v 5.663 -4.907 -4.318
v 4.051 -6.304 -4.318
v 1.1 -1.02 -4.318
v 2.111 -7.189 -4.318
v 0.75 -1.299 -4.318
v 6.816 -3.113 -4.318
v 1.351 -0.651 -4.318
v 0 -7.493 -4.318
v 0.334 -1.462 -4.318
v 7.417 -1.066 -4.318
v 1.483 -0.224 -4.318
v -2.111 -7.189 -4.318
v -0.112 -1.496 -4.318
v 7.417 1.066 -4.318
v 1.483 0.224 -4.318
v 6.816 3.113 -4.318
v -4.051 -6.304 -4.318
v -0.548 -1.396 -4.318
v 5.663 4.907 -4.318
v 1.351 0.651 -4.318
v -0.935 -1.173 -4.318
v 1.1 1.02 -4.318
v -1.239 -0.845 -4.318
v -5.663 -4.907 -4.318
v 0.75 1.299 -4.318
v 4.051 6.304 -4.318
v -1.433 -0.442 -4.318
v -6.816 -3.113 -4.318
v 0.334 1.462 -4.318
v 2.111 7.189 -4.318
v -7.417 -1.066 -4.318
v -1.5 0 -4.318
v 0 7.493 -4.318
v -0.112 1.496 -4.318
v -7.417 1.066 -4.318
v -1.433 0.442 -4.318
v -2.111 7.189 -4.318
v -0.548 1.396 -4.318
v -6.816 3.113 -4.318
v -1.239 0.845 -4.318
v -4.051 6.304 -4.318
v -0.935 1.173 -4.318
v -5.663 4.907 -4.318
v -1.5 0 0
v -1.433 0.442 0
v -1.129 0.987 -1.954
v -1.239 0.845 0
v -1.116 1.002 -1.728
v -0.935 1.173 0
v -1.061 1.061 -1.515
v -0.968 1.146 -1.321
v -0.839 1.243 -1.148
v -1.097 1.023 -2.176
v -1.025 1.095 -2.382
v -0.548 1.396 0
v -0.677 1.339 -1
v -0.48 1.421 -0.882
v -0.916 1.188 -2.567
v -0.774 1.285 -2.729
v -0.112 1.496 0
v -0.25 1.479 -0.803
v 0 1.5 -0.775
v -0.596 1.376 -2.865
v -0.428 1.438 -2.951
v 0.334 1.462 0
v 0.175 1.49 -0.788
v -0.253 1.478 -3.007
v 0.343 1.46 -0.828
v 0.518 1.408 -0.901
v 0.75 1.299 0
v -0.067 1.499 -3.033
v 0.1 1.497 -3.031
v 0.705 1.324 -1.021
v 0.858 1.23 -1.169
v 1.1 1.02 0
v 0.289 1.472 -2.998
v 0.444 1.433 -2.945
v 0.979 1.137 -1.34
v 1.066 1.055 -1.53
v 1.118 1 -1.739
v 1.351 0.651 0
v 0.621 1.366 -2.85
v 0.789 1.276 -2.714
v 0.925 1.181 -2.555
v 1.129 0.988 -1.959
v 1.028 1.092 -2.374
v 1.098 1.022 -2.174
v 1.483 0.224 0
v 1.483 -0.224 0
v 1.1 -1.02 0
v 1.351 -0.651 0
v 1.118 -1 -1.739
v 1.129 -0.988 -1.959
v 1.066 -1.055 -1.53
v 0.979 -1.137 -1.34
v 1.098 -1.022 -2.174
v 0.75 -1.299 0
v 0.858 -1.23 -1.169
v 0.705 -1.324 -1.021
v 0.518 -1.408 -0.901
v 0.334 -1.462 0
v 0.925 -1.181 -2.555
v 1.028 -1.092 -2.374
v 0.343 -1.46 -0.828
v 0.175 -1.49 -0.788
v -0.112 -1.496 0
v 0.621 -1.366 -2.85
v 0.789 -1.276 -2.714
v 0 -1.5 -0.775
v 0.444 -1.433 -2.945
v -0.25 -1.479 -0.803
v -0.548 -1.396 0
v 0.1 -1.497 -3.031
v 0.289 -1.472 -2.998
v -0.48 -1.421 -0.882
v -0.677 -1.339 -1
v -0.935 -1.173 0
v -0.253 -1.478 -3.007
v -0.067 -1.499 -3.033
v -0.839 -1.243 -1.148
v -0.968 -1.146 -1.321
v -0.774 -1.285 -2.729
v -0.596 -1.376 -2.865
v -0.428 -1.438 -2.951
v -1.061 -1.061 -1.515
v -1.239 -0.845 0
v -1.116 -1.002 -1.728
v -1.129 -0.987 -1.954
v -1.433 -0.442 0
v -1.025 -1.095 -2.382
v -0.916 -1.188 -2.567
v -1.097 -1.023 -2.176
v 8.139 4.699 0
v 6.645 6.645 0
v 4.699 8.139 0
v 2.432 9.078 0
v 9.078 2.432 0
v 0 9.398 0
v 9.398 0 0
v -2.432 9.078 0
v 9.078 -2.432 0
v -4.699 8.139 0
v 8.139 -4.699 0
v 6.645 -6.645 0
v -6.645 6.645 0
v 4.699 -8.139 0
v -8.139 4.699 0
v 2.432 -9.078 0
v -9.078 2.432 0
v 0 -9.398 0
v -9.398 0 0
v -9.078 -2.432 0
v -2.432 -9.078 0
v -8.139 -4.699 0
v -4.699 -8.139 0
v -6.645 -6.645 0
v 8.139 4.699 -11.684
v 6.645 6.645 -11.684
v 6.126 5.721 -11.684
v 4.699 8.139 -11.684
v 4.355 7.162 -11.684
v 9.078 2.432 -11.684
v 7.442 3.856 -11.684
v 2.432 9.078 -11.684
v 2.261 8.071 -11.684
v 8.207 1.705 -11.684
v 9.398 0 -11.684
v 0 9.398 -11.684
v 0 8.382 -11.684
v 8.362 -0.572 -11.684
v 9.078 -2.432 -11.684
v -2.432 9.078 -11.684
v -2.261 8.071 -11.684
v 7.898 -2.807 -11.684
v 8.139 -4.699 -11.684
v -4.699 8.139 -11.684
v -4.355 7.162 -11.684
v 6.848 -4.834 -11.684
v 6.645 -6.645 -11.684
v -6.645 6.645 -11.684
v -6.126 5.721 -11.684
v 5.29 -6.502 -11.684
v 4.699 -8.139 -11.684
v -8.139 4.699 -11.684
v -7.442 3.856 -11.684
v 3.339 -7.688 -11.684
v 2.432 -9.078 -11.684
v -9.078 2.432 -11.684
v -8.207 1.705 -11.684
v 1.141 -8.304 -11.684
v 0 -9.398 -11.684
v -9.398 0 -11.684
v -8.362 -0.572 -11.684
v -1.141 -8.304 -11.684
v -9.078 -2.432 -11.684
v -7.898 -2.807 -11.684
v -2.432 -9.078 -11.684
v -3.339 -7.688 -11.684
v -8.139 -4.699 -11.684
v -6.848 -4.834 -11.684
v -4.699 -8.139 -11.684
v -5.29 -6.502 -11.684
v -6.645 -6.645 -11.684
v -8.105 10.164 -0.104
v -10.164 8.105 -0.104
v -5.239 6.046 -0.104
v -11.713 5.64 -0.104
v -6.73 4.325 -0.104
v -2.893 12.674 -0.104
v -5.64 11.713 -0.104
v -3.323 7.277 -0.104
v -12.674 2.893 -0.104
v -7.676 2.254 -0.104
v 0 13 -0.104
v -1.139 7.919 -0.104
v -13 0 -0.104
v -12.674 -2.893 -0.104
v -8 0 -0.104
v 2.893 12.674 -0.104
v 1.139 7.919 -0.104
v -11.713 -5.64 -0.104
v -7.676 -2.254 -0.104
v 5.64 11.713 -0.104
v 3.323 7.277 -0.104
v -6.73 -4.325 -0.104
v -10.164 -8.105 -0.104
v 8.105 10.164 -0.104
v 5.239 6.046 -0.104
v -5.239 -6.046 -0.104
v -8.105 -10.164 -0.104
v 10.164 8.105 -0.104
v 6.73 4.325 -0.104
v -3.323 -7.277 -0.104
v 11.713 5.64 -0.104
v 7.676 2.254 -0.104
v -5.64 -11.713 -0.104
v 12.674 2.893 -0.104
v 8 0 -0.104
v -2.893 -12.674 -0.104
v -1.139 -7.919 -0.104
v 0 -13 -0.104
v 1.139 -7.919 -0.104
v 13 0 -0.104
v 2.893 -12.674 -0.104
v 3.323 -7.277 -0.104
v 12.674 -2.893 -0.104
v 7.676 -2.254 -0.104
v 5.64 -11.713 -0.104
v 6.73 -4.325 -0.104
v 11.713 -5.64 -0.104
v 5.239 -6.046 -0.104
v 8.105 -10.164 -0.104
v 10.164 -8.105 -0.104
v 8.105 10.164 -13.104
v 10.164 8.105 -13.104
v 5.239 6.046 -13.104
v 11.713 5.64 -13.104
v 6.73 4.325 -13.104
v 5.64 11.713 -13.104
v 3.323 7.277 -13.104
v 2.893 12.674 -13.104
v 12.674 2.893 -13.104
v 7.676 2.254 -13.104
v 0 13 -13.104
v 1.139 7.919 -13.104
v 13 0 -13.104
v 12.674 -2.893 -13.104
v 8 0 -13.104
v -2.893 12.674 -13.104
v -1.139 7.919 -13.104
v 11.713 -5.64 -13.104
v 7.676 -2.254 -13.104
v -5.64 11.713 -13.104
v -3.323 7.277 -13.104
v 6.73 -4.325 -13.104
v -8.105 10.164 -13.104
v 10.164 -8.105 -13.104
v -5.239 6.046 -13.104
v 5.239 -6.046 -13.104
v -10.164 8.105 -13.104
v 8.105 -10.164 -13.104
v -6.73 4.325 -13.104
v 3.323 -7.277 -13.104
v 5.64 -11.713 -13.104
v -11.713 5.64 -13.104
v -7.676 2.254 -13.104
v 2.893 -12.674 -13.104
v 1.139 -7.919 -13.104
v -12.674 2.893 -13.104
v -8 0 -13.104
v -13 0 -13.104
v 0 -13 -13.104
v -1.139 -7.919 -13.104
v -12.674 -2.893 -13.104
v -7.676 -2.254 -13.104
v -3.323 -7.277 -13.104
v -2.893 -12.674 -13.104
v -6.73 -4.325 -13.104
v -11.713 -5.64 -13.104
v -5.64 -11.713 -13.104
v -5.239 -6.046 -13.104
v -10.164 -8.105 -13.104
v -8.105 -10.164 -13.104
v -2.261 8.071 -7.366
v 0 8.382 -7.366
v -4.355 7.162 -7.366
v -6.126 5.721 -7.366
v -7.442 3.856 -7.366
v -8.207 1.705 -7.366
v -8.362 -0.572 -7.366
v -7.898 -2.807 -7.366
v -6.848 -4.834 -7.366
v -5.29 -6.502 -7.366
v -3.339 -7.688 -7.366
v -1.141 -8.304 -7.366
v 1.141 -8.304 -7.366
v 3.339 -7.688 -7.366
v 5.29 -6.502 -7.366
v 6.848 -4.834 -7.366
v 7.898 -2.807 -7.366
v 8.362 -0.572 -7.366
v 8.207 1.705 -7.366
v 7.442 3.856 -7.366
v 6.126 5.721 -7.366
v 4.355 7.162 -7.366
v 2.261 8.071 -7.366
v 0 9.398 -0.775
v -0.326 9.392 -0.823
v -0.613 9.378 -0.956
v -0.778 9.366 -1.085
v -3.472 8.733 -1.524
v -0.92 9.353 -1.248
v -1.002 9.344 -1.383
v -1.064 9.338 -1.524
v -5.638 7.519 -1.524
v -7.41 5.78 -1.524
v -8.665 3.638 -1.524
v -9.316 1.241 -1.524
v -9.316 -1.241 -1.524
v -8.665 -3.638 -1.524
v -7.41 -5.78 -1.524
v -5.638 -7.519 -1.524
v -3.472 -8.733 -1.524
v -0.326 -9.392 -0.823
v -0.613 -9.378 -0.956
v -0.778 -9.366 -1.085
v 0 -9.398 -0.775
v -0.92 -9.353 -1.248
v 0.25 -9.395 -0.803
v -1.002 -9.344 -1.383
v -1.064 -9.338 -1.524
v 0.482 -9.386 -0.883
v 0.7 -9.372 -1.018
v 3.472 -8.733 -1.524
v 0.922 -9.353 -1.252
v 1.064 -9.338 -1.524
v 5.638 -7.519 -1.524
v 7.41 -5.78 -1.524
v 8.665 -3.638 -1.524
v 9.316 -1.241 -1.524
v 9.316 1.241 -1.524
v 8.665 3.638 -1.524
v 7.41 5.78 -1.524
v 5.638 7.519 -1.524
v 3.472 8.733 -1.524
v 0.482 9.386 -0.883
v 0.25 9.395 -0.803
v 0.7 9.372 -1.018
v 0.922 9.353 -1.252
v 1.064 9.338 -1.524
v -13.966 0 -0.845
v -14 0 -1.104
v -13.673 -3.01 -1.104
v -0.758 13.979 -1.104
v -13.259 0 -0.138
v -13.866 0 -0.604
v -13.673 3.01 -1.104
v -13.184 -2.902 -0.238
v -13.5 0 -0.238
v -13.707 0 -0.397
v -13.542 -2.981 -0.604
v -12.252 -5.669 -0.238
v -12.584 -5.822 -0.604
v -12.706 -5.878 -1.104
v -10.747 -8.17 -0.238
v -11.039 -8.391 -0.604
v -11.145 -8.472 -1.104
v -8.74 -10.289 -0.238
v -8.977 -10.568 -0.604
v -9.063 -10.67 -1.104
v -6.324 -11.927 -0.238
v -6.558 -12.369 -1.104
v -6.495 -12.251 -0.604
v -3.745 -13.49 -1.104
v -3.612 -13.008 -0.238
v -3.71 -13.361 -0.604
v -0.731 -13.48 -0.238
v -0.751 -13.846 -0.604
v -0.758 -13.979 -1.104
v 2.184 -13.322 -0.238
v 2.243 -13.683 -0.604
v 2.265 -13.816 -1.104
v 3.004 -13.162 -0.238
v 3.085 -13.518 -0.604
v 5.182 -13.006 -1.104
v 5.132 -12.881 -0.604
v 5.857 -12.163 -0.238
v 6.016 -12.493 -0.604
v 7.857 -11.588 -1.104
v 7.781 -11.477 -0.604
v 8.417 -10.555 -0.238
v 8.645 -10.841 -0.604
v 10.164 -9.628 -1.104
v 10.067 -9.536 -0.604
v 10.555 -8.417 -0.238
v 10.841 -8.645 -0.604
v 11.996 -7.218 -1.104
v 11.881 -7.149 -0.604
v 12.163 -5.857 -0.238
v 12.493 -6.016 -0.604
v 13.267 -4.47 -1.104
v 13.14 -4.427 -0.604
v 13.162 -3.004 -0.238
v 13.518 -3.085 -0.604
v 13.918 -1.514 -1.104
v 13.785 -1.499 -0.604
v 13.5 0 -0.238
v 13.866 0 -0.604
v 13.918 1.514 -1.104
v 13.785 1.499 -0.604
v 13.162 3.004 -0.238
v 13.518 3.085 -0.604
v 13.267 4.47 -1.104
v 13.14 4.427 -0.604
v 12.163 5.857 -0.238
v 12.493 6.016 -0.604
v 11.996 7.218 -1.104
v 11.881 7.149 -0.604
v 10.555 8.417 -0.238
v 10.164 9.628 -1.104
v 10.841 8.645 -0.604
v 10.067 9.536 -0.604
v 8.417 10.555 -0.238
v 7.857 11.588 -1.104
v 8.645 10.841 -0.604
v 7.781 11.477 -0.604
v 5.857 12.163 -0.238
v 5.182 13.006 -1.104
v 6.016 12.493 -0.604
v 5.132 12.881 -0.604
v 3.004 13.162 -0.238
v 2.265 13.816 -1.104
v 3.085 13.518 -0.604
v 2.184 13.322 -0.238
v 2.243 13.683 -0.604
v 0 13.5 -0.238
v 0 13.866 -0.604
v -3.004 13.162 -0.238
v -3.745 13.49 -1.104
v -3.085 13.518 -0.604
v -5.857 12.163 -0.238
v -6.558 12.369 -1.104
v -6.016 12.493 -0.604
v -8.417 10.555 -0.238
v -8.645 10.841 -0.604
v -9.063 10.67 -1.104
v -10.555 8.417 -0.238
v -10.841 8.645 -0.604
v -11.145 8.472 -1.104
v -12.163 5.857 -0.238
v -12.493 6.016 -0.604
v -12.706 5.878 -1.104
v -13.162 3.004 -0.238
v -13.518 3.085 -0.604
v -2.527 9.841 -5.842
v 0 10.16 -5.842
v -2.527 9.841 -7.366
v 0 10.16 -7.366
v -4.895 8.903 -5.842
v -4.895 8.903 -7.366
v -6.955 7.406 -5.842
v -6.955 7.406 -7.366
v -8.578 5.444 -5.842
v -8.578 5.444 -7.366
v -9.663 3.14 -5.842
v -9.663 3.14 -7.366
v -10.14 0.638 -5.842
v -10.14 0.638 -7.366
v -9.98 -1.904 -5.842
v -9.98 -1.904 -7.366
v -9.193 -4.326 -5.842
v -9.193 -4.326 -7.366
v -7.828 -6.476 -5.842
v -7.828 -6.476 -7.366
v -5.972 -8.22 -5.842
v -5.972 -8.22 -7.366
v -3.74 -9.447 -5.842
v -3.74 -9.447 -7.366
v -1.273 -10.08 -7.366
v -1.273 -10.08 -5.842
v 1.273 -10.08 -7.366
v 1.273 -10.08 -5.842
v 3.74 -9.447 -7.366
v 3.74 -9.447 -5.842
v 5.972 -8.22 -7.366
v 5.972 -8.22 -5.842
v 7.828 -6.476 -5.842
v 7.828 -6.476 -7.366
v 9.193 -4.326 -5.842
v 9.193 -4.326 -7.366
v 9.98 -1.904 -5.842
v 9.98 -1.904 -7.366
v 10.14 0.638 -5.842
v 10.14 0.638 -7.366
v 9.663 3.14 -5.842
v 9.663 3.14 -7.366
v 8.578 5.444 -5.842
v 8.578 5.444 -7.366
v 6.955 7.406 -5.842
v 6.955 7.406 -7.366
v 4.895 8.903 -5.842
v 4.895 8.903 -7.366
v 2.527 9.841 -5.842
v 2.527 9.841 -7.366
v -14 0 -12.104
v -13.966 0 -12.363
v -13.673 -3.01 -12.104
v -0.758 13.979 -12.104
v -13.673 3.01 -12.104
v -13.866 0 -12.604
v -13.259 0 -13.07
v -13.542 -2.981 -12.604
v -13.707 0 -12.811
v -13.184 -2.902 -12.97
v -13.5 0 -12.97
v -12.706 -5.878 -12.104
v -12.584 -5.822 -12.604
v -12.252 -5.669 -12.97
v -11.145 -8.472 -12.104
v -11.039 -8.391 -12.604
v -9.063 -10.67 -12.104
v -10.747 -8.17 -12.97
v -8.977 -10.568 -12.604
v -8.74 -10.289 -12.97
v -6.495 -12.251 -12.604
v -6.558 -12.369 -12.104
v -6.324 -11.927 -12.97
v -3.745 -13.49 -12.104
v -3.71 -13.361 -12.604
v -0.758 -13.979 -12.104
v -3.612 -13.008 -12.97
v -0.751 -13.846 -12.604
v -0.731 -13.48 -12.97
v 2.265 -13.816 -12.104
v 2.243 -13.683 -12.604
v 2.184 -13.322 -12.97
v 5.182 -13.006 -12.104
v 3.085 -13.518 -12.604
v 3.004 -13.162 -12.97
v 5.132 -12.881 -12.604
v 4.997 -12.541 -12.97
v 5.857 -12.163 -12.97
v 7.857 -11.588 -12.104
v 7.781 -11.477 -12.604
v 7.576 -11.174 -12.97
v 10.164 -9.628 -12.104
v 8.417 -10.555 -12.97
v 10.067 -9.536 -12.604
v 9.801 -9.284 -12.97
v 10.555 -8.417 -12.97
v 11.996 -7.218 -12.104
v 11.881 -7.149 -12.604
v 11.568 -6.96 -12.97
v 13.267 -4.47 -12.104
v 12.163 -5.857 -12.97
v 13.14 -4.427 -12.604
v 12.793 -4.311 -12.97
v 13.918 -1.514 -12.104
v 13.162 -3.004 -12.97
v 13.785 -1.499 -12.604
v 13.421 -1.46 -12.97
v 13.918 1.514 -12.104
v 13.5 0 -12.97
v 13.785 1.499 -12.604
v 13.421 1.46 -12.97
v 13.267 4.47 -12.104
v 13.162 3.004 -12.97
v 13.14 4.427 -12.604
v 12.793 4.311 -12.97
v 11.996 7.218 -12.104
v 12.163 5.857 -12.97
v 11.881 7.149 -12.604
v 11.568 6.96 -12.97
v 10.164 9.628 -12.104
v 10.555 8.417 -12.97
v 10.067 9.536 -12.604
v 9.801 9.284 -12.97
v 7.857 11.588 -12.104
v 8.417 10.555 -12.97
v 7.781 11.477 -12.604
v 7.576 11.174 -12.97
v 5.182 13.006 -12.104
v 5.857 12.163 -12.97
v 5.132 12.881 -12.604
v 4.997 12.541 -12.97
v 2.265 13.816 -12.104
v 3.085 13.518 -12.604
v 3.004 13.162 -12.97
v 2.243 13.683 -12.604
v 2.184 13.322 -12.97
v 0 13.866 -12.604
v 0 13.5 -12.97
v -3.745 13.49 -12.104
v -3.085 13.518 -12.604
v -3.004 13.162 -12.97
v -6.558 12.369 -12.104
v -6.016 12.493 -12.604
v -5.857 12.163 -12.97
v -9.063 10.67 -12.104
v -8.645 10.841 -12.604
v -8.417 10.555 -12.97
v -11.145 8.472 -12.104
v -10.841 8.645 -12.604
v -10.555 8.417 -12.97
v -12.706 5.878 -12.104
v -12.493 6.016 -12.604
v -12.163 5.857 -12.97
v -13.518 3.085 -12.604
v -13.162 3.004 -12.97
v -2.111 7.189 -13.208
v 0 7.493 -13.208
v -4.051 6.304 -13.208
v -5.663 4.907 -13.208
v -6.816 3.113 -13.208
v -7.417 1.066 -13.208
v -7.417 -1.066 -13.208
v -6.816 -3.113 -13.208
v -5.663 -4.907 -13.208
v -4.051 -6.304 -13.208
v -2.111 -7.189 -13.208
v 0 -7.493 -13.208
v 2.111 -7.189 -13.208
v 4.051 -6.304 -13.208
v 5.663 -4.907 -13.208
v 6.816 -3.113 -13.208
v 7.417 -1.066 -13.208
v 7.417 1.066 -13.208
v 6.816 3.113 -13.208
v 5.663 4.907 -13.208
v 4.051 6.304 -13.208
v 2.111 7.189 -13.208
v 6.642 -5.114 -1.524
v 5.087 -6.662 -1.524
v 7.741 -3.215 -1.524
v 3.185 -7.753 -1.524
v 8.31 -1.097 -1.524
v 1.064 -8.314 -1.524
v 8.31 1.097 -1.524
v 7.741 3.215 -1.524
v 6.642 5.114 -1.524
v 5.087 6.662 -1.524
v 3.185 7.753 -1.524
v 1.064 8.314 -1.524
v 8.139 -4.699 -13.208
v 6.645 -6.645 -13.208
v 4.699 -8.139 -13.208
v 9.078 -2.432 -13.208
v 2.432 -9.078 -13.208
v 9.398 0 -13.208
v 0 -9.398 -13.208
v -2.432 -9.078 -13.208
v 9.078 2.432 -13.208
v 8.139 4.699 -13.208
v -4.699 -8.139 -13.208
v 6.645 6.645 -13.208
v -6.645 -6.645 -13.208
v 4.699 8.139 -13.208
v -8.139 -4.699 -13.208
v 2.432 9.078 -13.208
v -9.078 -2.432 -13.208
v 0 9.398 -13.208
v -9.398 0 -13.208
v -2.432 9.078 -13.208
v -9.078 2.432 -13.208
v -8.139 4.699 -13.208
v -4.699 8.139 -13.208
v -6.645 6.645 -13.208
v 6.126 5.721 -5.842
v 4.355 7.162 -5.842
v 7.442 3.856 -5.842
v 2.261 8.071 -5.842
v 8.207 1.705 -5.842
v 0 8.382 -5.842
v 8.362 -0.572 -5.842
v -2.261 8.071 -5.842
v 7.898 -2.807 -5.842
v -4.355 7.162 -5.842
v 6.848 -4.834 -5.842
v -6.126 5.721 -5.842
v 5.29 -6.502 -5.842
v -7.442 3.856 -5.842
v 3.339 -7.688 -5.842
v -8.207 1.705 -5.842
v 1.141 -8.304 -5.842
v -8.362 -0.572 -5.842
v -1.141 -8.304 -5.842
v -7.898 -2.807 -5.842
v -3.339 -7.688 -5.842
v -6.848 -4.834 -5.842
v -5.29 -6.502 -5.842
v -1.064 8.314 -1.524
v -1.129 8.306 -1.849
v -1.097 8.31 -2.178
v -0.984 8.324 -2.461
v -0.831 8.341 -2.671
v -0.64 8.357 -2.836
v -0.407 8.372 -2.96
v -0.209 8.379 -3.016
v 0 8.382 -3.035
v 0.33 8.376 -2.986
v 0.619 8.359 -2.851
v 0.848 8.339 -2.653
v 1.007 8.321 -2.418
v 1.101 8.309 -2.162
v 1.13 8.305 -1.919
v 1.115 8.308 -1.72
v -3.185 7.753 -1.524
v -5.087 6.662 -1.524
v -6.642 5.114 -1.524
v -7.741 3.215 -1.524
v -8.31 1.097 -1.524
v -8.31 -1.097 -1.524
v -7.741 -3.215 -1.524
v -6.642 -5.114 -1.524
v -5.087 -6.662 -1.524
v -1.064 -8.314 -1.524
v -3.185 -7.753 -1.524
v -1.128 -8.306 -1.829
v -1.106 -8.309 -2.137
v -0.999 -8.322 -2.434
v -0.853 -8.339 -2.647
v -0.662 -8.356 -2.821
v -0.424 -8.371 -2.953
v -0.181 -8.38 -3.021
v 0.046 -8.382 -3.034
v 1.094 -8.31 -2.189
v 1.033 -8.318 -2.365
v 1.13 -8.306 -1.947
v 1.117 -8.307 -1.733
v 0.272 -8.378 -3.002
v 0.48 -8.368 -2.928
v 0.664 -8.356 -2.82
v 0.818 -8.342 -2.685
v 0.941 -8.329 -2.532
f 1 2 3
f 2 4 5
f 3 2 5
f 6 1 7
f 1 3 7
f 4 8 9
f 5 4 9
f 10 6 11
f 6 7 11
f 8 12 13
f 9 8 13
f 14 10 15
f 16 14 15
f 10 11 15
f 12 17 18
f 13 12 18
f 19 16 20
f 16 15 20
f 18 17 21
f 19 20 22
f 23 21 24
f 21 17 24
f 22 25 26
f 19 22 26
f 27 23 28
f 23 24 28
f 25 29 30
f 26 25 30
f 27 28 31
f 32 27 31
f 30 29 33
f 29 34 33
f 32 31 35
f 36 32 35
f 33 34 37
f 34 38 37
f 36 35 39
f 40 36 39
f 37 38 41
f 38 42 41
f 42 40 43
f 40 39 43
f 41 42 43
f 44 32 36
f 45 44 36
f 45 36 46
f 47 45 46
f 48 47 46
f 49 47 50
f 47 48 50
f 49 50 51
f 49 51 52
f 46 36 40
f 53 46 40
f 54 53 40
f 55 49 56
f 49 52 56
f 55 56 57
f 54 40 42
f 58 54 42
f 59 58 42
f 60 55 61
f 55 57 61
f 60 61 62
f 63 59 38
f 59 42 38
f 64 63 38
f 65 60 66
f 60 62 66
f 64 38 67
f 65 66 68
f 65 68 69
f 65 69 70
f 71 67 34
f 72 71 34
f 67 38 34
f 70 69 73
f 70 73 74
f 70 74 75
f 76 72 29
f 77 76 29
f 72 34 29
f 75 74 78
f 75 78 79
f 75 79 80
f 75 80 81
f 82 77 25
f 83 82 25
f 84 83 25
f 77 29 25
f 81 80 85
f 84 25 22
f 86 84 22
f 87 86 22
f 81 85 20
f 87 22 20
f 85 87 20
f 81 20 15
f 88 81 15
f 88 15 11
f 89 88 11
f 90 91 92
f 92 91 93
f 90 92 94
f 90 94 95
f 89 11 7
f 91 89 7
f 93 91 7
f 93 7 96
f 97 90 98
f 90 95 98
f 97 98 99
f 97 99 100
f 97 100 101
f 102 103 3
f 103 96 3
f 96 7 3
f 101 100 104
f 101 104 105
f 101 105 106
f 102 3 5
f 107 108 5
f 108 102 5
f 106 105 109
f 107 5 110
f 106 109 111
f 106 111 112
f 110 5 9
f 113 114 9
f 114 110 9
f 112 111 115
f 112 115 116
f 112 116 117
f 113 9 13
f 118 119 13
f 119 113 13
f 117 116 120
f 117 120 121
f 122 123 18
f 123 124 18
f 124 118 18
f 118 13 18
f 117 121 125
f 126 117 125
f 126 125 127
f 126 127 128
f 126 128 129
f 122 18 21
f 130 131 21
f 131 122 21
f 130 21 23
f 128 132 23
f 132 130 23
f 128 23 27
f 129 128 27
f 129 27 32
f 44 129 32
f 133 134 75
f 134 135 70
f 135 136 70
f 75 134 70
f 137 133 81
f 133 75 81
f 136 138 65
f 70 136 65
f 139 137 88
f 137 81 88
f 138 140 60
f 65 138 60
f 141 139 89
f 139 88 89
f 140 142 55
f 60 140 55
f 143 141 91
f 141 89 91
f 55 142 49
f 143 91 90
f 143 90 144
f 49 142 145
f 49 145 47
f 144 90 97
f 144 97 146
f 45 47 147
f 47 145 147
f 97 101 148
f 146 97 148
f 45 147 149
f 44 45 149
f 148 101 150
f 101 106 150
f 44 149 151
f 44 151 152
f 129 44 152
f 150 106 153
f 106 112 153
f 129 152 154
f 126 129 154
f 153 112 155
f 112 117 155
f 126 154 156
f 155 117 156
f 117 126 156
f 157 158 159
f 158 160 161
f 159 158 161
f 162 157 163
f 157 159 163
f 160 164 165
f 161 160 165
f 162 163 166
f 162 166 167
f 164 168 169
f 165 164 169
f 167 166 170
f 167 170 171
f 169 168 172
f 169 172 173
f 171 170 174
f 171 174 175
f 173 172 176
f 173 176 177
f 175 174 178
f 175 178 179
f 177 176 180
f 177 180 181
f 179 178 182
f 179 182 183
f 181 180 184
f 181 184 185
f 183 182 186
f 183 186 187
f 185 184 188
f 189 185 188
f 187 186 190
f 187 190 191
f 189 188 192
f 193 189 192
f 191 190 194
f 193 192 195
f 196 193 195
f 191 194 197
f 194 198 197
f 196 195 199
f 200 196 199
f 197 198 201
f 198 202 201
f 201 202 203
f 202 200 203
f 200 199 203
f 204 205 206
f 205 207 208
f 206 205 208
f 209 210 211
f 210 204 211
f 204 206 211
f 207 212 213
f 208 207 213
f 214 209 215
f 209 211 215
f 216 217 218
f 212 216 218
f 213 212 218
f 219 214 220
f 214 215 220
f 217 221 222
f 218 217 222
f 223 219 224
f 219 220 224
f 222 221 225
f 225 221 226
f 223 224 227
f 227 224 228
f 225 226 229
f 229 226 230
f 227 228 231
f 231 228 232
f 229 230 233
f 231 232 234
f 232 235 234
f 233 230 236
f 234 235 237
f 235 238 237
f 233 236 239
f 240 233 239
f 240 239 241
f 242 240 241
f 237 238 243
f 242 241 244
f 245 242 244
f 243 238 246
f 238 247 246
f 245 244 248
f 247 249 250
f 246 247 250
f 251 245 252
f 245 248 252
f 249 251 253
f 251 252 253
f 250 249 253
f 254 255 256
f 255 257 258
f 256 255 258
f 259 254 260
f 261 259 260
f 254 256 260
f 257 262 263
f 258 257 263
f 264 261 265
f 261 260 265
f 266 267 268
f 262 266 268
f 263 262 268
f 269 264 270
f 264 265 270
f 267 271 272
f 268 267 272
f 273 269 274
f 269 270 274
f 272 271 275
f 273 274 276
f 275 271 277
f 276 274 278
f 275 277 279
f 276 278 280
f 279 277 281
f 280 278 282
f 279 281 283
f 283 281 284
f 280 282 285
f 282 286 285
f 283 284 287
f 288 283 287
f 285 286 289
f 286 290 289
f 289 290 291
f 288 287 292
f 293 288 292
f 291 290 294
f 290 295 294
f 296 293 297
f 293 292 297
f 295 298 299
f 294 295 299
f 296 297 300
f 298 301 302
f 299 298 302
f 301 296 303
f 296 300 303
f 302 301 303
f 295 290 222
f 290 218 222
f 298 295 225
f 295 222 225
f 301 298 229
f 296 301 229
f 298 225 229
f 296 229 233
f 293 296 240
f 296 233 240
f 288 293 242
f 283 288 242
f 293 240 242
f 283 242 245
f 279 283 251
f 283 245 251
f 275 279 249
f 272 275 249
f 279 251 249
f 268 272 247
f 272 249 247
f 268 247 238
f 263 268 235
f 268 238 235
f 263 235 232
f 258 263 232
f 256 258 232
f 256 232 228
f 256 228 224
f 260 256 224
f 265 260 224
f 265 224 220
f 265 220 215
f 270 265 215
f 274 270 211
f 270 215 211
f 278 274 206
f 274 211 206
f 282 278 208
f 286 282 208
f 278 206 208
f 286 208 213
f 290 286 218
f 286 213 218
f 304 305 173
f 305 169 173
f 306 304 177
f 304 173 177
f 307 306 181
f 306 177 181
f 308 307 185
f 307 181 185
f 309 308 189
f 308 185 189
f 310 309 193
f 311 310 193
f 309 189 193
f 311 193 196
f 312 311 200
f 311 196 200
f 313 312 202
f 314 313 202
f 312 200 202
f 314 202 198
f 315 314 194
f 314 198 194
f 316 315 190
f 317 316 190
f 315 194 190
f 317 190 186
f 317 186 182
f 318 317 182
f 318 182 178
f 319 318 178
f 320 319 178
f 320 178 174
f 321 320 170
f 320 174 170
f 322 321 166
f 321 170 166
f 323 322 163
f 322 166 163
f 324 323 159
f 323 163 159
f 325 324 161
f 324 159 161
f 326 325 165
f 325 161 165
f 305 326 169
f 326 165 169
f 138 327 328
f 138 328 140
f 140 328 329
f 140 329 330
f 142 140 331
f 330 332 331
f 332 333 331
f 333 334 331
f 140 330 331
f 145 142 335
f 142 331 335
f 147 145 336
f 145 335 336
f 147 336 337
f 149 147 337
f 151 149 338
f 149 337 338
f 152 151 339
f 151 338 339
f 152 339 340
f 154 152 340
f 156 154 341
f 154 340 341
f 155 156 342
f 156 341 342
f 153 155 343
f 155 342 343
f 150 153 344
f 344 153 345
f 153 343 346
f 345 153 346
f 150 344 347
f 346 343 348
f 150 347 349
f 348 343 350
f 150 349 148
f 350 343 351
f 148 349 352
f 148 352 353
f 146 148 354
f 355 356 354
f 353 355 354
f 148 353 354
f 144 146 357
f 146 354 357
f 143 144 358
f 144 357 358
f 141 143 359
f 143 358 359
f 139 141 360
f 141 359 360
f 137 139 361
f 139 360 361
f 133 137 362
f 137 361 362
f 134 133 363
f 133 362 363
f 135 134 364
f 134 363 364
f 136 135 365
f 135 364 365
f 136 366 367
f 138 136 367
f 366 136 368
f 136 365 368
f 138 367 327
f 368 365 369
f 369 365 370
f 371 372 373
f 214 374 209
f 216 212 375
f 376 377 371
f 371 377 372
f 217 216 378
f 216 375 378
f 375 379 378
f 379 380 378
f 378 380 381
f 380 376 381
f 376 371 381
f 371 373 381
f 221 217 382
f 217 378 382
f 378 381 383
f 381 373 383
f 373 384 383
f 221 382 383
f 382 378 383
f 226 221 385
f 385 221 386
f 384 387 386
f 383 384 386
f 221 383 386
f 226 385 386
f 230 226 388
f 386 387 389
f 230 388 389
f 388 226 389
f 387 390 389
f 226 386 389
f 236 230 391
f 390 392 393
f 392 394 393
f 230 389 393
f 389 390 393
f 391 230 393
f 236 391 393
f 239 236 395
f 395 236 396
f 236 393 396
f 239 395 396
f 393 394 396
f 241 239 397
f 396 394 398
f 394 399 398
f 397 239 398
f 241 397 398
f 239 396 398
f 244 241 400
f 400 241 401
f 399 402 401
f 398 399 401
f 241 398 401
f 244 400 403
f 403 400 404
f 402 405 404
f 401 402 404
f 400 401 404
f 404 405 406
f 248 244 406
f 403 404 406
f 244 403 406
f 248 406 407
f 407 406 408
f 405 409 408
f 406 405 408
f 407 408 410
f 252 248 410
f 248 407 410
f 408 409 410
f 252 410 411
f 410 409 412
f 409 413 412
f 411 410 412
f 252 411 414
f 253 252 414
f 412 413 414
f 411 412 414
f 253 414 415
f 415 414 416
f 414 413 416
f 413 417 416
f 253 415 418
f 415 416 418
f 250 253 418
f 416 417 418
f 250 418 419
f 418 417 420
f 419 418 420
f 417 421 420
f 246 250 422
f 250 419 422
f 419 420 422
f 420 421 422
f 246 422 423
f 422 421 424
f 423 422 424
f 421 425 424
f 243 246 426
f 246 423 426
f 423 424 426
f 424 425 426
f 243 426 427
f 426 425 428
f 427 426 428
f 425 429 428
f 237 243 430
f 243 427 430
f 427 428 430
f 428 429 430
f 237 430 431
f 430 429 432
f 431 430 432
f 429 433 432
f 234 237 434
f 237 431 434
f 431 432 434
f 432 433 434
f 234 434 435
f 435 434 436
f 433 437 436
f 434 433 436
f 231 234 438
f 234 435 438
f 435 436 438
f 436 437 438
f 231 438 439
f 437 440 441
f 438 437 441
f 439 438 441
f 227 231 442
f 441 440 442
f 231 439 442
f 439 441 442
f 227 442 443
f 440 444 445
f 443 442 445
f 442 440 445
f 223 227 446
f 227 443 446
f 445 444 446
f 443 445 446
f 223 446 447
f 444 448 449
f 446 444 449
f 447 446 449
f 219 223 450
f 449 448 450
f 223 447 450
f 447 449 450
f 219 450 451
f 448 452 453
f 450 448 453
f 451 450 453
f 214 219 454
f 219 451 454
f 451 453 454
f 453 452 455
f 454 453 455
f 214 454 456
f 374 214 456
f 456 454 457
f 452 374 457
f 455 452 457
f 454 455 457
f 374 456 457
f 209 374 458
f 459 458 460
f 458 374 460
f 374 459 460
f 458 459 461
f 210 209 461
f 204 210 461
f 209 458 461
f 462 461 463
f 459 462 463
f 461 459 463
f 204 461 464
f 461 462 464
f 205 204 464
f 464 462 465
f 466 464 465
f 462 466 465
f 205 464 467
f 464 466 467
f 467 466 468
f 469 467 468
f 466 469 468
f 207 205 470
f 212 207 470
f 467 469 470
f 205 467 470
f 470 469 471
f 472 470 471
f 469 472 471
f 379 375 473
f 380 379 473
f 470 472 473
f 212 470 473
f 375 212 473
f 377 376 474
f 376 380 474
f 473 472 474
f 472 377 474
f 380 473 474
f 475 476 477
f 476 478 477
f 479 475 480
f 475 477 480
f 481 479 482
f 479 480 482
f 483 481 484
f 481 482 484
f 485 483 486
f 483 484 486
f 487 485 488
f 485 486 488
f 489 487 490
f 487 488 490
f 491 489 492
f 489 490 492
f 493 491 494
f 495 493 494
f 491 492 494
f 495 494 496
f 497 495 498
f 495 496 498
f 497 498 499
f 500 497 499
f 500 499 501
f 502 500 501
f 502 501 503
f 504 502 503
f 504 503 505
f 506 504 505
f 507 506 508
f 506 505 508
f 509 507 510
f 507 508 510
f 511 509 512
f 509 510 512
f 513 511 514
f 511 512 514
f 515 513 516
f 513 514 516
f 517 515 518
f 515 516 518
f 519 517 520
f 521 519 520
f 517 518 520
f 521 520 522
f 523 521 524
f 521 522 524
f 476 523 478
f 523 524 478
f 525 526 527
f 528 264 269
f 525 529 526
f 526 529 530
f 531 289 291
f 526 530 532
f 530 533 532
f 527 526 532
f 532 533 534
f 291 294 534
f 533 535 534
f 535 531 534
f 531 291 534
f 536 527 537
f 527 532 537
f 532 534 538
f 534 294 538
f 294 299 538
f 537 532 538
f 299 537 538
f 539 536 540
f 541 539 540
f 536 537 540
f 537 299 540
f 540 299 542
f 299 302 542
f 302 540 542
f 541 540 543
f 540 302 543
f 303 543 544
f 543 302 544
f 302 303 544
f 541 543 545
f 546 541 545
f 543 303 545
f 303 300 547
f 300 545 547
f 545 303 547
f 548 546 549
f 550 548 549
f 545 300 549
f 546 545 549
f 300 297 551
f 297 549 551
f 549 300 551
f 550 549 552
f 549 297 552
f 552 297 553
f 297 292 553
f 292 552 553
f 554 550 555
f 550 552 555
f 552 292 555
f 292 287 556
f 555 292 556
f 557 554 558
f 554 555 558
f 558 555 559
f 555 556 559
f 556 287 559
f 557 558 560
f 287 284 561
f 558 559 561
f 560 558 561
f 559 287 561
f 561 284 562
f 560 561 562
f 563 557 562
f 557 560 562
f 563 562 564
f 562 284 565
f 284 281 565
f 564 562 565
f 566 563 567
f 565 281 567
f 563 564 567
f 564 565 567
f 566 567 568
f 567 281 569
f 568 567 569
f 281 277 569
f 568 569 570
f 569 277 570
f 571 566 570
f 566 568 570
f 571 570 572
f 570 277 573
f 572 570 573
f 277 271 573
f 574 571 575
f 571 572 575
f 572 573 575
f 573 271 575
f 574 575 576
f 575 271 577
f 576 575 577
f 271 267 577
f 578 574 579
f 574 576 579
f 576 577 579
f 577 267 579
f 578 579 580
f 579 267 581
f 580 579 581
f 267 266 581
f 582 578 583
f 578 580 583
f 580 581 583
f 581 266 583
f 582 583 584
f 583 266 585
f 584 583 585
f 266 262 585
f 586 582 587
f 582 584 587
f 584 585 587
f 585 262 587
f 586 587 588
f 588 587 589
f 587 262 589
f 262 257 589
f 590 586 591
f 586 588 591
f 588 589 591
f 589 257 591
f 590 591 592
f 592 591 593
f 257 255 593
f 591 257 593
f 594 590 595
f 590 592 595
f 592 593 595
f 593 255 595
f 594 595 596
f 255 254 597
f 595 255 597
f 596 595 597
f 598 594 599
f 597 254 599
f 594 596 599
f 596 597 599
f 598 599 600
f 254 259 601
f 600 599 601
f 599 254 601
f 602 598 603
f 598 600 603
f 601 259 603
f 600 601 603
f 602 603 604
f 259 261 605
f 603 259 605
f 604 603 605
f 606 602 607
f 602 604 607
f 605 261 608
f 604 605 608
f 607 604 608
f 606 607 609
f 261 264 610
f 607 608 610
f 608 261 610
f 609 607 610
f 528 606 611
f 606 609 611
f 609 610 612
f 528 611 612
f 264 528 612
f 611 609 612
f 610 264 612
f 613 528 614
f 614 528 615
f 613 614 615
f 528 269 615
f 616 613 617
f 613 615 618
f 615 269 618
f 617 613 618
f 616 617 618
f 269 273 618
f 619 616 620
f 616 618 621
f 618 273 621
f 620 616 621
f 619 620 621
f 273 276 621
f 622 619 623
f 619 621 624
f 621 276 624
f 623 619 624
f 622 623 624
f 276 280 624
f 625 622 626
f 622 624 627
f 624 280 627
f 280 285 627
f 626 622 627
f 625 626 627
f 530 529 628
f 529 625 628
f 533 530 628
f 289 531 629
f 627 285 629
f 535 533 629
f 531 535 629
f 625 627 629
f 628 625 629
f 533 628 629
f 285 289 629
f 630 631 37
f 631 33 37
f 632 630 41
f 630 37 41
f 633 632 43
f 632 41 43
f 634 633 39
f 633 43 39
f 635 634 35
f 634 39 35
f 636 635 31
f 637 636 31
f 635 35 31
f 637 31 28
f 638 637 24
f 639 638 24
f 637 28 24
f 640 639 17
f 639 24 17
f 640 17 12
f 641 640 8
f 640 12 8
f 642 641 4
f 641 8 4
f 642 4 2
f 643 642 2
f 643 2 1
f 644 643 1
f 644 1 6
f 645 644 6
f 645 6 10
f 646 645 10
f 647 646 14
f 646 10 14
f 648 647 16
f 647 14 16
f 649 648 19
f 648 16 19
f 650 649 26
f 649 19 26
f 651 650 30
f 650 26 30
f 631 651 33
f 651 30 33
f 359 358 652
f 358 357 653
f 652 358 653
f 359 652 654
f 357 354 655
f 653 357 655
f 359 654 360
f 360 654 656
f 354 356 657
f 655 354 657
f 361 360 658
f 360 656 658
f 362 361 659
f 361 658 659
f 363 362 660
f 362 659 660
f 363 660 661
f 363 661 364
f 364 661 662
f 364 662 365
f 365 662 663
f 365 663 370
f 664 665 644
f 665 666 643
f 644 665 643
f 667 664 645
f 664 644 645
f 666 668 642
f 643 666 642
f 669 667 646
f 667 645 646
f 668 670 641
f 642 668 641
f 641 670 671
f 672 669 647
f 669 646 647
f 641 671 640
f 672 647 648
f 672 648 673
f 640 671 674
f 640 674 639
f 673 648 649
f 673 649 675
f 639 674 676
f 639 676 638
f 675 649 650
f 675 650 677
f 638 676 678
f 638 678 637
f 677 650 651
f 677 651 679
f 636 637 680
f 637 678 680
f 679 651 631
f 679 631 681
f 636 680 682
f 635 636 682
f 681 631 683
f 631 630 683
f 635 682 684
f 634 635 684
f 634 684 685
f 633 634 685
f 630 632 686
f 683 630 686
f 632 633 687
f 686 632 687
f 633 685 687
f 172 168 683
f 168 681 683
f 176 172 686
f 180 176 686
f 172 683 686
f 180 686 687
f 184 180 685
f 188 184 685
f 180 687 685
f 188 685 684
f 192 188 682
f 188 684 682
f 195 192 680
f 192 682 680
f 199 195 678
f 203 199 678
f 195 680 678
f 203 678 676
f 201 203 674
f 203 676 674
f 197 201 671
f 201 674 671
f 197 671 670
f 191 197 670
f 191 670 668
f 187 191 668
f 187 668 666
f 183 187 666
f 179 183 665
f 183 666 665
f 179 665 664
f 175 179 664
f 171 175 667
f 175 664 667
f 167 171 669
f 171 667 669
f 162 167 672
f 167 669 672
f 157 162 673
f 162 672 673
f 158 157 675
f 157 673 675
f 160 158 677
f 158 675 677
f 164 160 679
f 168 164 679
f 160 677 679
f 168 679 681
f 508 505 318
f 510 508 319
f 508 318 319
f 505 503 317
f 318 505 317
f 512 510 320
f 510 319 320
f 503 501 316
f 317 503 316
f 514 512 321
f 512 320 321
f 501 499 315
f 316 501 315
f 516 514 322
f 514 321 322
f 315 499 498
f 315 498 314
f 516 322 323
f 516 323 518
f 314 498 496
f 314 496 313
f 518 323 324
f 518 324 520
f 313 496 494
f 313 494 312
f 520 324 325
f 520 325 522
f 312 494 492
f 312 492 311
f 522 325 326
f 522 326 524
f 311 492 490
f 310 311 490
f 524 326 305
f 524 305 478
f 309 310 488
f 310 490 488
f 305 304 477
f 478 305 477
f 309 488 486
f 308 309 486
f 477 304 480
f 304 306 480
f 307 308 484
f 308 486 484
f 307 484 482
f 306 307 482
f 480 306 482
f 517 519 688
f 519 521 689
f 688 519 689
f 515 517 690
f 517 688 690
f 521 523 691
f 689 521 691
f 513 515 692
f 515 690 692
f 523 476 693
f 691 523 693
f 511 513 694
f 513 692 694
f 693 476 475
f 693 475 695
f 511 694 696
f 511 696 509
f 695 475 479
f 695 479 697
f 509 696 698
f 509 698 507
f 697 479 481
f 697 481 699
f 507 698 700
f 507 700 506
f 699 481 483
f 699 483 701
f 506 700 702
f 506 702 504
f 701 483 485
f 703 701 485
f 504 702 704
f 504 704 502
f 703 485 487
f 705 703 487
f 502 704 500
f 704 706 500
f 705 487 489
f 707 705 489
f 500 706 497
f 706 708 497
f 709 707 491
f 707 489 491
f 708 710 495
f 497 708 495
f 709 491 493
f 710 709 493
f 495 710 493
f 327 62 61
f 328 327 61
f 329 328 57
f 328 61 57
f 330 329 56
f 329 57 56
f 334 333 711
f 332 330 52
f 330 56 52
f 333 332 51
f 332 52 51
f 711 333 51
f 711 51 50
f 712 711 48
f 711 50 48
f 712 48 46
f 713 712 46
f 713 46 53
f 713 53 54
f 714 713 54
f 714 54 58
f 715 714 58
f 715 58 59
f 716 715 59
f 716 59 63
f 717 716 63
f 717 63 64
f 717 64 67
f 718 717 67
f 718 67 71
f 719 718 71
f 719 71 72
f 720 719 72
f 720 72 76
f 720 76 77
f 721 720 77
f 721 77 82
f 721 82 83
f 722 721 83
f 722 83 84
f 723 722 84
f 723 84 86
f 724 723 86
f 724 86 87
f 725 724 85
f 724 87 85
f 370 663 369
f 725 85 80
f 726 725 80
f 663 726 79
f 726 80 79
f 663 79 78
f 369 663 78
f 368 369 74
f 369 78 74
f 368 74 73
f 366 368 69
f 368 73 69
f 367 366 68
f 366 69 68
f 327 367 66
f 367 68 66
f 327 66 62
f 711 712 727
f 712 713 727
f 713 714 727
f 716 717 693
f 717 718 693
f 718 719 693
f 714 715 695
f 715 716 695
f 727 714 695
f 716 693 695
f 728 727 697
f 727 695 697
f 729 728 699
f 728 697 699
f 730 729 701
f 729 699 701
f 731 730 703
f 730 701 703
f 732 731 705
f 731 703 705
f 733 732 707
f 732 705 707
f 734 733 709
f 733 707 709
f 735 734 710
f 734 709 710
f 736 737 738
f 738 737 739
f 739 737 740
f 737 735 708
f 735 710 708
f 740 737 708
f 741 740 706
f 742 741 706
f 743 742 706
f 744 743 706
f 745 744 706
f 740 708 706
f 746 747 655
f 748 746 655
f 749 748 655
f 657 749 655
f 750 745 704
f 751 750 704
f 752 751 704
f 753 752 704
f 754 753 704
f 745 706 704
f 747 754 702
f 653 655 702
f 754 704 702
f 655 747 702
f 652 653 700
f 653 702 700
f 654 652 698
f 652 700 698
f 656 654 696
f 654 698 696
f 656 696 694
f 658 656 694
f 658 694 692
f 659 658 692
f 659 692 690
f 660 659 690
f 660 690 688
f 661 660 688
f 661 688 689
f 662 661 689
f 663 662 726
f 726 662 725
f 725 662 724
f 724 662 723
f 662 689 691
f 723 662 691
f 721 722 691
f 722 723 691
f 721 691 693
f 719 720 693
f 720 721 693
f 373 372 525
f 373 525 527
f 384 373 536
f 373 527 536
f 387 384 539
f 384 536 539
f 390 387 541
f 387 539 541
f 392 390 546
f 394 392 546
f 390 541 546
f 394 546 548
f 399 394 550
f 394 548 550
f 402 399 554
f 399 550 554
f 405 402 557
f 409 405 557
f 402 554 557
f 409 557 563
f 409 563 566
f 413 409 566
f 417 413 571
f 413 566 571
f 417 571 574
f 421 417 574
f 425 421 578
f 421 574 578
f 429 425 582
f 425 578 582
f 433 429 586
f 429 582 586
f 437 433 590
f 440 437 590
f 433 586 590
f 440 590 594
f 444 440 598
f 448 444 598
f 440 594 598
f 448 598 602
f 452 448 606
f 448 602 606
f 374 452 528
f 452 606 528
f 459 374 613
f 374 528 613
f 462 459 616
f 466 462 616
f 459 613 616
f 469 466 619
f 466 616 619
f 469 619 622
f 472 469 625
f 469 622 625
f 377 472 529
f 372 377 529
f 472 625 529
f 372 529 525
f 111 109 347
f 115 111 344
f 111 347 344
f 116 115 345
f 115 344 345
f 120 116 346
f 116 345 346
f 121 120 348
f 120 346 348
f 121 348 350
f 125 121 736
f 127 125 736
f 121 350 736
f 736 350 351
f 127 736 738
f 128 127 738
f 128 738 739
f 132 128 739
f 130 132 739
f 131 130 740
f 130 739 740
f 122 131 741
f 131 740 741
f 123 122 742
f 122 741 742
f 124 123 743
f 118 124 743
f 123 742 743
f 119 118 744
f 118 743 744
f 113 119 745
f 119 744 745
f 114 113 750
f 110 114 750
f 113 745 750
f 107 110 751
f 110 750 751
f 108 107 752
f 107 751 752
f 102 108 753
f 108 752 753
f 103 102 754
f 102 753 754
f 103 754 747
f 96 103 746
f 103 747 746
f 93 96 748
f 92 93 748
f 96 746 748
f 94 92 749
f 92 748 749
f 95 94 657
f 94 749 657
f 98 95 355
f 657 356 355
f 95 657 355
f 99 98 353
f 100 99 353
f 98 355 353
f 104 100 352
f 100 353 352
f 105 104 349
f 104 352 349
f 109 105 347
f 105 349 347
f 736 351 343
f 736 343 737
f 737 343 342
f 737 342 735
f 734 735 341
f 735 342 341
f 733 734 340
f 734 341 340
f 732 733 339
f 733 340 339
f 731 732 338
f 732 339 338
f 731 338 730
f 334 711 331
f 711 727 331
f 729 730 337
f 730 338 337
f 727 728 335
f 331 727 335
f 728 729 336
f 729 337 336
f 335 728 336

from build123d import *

# Parameters (mm, degrees)
F_3_0_3_DIAMETER_HOLE1_D = 3
SKETCH4_W                = 1.1303
SKETCH4_H                = 23.398


with BuildPart() as part:
    # Sketch1 → Revolve1 (revolve)
    with BuildSketch(Plane(origin=(0, 0, 0), x_dir=(0, 0, -1), z_dir=(1, 0, 0))):
        Polygon((0, 0), (0, 9.398), (1.524, 9.398), (1.524, 8.382), (5.842, 8.382), (5.842, 10.16), (7.366, 10.16), (7.366, 8.382), (11.684, 8.382), (11.684, 9.398), (13.208, 9.398), (13.208, 7.493), (4.318, 7.493), (4.318, 0), align=None)
    revolve(axis=Axis((0, 0, -13.776427276), (0, 0, 1)))

    # Ø3.0 (3) Diameter Hole1 (through all)
    with Locations(Plane.XY):
        with Locations((0, 0)):
            Hole(F_3_0_3_DIAMETER_HOLE1_D / 2)

    # Sketch4 → #4-40 Tapped Hole1 (revolve, cut)
    with BuildSketch(Plane(origin=(0, 9.398, -1.905), x_dir=(0, 0, 1), z_dir=(1, 0, 0))):
        with Locations((0.56515, 11.699)):
            Rectangle(SKETCH4_W, SKETCH4_H)
    revolve(axis=Axis((0, 15.748, -1.905), (0, -1, 0)), mode=Mode.SUBTRACT)


with BuildPart() as body_2:
    # Sketch5 → Revolve2 (revolve)
    with BuildSketch(Plane(origin=(0, 0, 0), x_dir=(0, 0, -1), z_dir=(1, 0, 0)), mode=Mode.PRIVATE) as revolve2_sk:
        with BuildLine():
            Line((1.104, 14), (12.104, 14))
            ThreePointArc((12.104, 14), (12.811106781, 13.707106781), (13.104, 13))
            Line((13.104, 13), (13.104, 8))
            Line((13.104, 8), (0.104, 8))
            Line((0.104, 8), (0.104, 13))
            ThreePointArc((0.104, 13), (0.396893219, 13.707106781), (1.104, 14))
        make_face()
    revolve(revolve2_sk.sketch.rotate(Axis((0, 0, -80.9), (0, 0, 1)), 90), axis=Axis((0, 0, -80.9), (0, 0, 1)))


solid = Compound([part.part, body_2.part])
